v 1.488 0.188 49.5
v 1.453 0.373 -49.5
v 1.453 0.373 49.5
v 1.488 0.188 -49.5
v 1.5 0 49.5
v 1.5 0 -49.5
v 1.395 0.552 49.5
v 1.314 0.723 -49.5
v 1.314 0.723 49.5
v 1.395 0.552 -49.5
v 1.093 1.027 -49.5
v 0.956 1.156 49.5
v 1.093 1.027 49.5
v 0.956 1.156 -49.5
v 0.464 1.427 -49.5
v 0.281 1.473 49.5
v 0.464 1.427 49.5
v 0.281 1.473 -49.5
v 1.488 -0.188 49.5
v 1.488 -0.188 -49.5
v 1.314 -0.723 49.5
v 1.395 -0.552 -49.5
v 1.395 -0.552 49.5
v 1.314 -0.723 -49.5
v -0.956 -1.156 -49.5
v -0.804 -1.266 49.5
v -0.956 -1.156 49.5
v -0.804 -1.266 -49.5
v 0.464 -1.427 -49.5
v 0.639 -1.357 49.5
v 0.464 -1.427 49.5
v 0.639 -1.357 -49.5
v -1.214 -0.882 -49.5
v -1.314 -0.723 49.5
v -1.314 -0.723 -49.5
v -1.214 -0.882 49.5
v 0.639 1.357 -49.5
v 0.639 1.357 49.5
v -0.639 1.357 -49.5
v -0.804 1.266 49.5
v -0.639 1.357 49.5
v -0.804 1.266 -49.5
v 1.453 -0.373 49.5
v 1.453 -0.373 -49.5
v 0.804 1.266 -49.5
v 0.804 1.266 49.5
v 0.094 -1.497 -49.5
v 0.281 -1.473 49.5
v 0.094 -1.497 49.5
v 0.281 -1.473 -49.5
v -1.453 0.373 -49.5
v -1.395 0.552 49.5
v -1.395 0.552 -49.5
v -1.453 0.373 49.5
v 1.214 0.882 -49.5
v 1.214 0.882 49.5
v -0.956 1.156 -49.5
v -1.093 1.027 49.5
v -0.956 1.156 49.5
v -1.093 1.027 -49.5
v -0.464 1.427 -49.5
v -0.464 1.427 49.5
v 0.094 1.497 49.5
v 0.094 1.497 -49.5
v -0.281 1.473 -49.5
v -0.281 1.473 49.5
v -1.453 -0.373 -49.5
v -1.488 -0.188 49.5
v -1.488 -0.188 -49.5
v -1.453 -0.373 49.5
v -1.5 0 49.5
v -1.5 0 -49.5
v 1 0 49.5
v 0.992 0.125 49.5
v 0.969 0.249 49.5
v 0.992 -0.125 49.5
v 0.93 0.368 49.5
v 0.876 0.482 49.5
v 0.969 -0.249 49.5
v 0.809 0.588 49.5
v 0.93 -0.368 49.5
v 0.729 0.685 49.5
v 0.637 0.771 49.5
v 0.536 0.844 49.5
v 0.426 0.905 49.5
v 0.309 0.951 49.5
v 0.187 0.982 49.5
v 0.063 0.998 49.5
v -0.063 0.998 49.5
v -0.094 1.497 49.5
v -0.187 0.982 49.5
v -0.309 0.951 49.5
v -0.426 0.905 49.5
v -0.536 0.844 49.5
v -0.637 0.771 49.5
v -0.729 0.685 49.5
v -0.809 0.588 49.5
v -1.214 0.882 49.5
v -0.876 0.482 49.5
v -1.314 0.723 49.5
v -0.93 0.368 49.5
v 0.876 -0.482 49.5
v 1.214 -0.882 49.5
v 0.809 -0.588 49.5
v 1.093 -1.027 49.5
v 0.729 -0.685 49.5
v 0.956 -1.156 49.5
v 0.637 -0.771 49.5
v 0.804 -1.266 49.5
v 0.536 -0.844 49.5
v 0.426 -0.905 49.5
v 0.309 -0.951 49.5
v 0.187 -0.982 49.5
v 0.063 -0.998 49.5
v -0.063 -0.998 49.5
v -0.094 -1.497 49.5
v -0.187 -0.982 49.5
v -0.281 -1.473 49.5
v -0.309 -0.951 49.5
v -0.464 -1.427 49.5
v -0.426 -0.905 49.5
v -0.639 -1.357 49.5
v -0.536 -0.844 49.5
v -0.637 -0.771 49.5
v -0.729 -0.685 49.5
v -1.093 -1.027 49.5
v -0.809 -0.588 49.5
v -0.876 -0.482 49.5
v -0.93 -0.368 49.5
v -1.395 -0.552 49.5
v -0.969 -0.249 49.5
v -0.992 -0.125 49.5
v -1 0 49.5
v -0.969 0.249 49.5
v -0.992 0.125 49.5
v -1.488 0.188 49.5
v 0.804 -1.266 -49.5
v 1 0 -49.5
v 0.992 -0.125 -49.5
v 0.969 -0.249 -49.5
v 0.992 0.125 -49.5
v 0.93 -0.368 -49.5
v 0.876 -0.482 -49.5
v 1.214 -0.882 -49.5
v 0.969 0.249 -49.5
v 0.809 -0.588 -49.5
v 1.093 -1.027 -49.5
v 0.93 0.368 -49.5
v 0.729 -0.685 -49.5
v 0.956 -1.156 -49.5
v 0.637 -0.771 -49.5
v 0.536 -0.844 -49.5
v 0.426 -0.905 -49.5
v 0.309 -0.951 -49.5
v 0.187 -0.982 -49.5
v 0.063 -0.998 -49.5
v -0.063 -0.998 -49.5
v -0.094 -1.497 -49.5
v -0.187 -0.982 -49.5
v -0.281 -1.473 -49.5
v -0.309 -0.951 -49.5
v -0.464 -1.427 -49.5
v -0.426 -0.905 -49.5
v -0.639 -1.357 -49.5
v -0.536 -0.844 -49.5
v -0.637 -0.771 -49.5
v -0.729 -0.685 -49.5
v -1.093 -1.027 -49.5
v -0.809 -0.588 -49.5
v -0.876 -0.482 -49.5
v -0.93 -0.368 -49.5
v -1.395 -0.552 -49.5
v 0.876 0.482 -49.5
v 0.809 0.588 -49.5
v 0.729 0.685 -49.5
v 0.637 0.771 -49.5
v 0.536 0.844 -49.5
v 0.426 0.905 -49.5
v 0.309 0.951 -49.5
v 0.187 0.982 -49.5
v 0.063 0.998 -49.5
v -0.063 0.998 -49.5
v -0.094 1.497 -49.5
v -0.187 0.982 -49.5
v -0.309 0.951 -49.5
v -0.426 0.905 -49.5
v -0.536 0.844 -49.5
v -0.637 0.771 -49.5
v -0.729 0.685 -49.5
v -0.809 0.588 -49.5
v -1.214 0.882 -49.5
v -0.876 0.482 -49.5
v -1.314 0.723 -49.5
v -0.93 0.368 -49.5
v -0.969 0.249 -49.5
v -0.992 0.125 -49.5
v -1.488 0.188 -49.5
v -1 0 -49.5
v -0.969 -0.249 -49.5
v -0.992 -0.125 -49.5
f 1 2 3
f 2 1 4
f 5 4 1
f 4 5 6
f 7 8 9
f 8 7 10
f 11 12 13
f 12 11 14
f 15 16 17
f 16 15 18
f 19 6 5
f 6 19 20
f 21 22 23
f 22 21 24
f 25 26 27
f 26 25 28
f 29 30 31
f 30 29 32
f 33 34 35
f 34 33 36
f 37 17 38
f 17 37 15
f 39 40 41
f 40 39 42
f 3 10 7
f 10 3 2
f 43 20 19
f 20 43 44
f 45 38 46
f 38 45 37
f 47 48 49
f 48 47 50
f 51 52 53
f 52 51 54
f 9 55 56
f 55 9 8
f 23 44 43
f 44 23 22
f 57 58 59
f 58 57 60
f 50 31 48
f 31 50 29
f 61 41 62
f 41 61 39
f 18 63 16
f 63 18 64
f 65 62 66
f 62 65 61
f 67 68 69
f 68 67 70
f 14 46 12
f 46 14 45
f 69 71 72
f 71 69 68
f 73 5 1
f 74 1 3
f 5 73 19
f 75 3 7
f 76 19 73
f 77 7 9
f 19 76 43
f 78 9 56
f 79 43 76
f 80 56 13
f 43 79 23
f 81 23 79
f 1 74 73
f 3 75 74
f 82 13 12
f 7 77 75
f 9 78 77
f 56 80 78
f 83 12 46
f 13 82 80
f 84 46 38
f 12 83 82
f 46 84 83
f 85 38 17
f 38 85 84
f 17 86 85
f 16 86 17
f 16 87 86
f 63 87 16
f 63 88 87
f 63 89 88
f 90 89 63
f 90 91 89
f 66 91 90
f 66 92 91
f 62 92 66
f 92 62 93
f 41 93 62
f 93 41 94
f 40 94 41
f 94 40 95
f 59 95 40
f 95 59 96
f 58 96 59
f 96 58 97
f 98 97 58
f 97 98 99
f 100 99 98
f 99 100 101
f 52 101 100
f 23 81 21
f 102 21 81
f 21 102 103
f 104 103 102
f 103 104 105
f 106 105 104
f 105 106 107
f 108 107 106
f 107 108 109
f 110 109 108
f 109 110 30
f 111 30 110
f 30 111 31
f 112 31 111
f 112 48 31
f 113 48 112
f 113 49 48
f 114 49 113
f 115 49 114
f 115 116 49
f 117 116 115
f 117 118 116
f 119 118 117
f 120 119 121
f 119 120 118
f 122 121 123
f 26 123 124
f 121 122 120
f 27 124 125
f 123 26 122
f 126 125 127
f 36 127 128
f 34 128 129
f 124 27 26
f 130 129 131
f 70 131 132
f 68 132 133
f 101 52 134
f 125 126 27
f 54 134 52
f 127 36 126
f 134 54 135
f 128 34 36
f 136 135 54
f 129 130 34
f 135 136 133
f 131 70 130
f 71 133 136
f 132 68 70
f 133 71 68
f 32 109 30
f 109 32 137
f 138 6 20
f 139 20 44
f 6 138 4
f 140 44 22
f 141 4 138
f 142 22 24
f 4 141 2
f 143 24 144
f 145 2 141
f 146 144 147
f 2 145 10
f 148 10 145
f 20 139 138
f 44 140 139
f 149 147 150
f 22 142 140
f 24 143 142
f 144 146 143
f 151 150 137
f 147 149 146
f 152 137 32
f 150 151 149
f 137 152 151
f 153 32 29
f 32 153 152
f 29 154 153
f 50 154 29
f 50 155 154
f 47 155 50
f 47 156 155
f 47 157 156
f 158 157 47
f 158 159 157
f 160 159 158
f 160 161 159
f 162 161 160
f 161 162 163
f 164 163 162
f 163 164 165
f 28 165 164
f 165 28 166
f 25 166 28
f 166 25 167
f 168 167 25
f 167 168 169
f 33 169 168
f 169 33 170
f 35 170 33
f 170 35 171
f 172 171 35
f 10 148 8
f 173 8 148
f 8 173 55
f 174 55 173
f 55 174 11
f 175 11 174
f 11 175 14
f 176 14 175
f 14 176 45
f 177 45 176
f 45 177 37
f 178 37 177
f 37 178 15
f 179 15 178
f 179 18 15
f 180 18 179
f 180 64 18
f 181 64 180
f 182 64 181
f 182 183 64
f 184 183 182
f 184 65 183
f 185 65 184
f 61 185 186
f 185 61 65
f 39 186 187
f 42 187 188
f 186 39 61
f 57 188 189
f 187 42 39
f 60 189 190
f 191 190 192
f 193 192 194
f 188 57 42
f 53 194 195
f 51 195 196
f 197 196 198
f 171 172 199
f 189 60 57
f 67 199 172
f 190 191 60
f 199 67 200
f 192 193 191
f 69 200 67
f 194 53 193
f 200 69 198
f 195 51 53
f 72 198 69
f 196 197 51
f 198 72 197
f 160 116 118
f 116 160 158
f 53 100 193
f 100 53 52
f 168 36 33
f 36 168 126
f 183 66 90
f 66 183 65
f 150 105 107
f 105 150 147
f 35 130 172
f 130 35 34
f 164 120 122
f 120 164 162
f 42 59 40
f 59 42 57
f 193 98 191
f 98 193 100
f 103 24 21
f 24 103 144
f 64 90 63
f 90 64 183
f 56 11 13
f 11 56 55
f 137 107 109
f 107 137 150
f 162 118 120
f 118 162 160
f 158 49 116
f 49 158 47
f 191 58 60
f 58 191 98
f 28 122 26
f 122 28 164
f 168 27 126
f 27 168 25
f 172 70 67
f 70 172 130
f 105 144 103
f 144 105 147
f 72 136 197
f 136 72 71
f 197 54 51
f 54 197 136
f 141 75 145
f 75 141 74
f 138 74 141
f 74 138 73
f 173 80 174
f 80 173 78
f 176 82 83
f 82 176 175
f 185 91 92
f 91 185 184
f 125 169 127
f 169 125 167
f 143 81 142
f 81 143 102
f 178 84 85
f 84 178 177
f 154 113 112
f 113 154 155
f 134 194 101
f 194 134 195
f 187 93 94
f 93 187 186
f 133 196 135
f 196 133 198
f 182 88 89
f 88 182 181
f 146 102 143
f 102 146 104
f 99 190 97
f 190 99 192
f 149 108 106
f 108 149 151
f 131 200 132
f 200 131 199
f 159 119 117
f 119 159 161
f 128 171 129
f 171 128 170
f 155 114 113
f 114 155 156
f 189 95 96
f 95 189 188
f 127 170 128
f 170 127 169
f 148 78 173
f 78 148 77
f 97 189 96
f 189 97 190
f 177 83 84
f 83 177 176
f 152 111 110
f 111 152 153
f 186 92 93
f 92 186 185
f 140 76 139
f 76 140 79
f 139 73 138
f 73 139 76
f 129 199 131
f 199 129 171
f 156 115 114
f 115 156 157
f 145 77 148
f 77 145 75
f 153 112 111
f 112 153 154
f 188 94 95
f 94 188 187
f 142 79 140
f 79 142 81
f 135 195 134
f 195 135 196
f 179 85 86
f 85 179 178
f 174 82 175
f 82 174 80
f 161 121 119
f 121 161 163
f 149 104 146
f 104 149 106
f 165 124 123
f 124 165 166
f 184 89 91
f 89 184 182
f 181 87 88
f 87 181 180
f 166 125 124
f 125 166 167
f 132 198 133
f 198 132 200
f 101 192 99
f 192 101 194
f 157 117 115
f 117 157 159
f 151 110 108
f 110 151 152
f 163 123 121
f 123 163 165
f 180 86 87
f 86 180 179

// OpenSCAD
$fn = 50;


difference() {
	union() {
		translate(v = [0, 0, -49.5000000000]) {
			cylinder(h = 99, r = 1.5000000000);
		}
	}
	union() {
		translate(v = [0, 0, -100.0000000000]) {
			cylinder(h = 200, r = 1.0000000000);
		}
	}
}
